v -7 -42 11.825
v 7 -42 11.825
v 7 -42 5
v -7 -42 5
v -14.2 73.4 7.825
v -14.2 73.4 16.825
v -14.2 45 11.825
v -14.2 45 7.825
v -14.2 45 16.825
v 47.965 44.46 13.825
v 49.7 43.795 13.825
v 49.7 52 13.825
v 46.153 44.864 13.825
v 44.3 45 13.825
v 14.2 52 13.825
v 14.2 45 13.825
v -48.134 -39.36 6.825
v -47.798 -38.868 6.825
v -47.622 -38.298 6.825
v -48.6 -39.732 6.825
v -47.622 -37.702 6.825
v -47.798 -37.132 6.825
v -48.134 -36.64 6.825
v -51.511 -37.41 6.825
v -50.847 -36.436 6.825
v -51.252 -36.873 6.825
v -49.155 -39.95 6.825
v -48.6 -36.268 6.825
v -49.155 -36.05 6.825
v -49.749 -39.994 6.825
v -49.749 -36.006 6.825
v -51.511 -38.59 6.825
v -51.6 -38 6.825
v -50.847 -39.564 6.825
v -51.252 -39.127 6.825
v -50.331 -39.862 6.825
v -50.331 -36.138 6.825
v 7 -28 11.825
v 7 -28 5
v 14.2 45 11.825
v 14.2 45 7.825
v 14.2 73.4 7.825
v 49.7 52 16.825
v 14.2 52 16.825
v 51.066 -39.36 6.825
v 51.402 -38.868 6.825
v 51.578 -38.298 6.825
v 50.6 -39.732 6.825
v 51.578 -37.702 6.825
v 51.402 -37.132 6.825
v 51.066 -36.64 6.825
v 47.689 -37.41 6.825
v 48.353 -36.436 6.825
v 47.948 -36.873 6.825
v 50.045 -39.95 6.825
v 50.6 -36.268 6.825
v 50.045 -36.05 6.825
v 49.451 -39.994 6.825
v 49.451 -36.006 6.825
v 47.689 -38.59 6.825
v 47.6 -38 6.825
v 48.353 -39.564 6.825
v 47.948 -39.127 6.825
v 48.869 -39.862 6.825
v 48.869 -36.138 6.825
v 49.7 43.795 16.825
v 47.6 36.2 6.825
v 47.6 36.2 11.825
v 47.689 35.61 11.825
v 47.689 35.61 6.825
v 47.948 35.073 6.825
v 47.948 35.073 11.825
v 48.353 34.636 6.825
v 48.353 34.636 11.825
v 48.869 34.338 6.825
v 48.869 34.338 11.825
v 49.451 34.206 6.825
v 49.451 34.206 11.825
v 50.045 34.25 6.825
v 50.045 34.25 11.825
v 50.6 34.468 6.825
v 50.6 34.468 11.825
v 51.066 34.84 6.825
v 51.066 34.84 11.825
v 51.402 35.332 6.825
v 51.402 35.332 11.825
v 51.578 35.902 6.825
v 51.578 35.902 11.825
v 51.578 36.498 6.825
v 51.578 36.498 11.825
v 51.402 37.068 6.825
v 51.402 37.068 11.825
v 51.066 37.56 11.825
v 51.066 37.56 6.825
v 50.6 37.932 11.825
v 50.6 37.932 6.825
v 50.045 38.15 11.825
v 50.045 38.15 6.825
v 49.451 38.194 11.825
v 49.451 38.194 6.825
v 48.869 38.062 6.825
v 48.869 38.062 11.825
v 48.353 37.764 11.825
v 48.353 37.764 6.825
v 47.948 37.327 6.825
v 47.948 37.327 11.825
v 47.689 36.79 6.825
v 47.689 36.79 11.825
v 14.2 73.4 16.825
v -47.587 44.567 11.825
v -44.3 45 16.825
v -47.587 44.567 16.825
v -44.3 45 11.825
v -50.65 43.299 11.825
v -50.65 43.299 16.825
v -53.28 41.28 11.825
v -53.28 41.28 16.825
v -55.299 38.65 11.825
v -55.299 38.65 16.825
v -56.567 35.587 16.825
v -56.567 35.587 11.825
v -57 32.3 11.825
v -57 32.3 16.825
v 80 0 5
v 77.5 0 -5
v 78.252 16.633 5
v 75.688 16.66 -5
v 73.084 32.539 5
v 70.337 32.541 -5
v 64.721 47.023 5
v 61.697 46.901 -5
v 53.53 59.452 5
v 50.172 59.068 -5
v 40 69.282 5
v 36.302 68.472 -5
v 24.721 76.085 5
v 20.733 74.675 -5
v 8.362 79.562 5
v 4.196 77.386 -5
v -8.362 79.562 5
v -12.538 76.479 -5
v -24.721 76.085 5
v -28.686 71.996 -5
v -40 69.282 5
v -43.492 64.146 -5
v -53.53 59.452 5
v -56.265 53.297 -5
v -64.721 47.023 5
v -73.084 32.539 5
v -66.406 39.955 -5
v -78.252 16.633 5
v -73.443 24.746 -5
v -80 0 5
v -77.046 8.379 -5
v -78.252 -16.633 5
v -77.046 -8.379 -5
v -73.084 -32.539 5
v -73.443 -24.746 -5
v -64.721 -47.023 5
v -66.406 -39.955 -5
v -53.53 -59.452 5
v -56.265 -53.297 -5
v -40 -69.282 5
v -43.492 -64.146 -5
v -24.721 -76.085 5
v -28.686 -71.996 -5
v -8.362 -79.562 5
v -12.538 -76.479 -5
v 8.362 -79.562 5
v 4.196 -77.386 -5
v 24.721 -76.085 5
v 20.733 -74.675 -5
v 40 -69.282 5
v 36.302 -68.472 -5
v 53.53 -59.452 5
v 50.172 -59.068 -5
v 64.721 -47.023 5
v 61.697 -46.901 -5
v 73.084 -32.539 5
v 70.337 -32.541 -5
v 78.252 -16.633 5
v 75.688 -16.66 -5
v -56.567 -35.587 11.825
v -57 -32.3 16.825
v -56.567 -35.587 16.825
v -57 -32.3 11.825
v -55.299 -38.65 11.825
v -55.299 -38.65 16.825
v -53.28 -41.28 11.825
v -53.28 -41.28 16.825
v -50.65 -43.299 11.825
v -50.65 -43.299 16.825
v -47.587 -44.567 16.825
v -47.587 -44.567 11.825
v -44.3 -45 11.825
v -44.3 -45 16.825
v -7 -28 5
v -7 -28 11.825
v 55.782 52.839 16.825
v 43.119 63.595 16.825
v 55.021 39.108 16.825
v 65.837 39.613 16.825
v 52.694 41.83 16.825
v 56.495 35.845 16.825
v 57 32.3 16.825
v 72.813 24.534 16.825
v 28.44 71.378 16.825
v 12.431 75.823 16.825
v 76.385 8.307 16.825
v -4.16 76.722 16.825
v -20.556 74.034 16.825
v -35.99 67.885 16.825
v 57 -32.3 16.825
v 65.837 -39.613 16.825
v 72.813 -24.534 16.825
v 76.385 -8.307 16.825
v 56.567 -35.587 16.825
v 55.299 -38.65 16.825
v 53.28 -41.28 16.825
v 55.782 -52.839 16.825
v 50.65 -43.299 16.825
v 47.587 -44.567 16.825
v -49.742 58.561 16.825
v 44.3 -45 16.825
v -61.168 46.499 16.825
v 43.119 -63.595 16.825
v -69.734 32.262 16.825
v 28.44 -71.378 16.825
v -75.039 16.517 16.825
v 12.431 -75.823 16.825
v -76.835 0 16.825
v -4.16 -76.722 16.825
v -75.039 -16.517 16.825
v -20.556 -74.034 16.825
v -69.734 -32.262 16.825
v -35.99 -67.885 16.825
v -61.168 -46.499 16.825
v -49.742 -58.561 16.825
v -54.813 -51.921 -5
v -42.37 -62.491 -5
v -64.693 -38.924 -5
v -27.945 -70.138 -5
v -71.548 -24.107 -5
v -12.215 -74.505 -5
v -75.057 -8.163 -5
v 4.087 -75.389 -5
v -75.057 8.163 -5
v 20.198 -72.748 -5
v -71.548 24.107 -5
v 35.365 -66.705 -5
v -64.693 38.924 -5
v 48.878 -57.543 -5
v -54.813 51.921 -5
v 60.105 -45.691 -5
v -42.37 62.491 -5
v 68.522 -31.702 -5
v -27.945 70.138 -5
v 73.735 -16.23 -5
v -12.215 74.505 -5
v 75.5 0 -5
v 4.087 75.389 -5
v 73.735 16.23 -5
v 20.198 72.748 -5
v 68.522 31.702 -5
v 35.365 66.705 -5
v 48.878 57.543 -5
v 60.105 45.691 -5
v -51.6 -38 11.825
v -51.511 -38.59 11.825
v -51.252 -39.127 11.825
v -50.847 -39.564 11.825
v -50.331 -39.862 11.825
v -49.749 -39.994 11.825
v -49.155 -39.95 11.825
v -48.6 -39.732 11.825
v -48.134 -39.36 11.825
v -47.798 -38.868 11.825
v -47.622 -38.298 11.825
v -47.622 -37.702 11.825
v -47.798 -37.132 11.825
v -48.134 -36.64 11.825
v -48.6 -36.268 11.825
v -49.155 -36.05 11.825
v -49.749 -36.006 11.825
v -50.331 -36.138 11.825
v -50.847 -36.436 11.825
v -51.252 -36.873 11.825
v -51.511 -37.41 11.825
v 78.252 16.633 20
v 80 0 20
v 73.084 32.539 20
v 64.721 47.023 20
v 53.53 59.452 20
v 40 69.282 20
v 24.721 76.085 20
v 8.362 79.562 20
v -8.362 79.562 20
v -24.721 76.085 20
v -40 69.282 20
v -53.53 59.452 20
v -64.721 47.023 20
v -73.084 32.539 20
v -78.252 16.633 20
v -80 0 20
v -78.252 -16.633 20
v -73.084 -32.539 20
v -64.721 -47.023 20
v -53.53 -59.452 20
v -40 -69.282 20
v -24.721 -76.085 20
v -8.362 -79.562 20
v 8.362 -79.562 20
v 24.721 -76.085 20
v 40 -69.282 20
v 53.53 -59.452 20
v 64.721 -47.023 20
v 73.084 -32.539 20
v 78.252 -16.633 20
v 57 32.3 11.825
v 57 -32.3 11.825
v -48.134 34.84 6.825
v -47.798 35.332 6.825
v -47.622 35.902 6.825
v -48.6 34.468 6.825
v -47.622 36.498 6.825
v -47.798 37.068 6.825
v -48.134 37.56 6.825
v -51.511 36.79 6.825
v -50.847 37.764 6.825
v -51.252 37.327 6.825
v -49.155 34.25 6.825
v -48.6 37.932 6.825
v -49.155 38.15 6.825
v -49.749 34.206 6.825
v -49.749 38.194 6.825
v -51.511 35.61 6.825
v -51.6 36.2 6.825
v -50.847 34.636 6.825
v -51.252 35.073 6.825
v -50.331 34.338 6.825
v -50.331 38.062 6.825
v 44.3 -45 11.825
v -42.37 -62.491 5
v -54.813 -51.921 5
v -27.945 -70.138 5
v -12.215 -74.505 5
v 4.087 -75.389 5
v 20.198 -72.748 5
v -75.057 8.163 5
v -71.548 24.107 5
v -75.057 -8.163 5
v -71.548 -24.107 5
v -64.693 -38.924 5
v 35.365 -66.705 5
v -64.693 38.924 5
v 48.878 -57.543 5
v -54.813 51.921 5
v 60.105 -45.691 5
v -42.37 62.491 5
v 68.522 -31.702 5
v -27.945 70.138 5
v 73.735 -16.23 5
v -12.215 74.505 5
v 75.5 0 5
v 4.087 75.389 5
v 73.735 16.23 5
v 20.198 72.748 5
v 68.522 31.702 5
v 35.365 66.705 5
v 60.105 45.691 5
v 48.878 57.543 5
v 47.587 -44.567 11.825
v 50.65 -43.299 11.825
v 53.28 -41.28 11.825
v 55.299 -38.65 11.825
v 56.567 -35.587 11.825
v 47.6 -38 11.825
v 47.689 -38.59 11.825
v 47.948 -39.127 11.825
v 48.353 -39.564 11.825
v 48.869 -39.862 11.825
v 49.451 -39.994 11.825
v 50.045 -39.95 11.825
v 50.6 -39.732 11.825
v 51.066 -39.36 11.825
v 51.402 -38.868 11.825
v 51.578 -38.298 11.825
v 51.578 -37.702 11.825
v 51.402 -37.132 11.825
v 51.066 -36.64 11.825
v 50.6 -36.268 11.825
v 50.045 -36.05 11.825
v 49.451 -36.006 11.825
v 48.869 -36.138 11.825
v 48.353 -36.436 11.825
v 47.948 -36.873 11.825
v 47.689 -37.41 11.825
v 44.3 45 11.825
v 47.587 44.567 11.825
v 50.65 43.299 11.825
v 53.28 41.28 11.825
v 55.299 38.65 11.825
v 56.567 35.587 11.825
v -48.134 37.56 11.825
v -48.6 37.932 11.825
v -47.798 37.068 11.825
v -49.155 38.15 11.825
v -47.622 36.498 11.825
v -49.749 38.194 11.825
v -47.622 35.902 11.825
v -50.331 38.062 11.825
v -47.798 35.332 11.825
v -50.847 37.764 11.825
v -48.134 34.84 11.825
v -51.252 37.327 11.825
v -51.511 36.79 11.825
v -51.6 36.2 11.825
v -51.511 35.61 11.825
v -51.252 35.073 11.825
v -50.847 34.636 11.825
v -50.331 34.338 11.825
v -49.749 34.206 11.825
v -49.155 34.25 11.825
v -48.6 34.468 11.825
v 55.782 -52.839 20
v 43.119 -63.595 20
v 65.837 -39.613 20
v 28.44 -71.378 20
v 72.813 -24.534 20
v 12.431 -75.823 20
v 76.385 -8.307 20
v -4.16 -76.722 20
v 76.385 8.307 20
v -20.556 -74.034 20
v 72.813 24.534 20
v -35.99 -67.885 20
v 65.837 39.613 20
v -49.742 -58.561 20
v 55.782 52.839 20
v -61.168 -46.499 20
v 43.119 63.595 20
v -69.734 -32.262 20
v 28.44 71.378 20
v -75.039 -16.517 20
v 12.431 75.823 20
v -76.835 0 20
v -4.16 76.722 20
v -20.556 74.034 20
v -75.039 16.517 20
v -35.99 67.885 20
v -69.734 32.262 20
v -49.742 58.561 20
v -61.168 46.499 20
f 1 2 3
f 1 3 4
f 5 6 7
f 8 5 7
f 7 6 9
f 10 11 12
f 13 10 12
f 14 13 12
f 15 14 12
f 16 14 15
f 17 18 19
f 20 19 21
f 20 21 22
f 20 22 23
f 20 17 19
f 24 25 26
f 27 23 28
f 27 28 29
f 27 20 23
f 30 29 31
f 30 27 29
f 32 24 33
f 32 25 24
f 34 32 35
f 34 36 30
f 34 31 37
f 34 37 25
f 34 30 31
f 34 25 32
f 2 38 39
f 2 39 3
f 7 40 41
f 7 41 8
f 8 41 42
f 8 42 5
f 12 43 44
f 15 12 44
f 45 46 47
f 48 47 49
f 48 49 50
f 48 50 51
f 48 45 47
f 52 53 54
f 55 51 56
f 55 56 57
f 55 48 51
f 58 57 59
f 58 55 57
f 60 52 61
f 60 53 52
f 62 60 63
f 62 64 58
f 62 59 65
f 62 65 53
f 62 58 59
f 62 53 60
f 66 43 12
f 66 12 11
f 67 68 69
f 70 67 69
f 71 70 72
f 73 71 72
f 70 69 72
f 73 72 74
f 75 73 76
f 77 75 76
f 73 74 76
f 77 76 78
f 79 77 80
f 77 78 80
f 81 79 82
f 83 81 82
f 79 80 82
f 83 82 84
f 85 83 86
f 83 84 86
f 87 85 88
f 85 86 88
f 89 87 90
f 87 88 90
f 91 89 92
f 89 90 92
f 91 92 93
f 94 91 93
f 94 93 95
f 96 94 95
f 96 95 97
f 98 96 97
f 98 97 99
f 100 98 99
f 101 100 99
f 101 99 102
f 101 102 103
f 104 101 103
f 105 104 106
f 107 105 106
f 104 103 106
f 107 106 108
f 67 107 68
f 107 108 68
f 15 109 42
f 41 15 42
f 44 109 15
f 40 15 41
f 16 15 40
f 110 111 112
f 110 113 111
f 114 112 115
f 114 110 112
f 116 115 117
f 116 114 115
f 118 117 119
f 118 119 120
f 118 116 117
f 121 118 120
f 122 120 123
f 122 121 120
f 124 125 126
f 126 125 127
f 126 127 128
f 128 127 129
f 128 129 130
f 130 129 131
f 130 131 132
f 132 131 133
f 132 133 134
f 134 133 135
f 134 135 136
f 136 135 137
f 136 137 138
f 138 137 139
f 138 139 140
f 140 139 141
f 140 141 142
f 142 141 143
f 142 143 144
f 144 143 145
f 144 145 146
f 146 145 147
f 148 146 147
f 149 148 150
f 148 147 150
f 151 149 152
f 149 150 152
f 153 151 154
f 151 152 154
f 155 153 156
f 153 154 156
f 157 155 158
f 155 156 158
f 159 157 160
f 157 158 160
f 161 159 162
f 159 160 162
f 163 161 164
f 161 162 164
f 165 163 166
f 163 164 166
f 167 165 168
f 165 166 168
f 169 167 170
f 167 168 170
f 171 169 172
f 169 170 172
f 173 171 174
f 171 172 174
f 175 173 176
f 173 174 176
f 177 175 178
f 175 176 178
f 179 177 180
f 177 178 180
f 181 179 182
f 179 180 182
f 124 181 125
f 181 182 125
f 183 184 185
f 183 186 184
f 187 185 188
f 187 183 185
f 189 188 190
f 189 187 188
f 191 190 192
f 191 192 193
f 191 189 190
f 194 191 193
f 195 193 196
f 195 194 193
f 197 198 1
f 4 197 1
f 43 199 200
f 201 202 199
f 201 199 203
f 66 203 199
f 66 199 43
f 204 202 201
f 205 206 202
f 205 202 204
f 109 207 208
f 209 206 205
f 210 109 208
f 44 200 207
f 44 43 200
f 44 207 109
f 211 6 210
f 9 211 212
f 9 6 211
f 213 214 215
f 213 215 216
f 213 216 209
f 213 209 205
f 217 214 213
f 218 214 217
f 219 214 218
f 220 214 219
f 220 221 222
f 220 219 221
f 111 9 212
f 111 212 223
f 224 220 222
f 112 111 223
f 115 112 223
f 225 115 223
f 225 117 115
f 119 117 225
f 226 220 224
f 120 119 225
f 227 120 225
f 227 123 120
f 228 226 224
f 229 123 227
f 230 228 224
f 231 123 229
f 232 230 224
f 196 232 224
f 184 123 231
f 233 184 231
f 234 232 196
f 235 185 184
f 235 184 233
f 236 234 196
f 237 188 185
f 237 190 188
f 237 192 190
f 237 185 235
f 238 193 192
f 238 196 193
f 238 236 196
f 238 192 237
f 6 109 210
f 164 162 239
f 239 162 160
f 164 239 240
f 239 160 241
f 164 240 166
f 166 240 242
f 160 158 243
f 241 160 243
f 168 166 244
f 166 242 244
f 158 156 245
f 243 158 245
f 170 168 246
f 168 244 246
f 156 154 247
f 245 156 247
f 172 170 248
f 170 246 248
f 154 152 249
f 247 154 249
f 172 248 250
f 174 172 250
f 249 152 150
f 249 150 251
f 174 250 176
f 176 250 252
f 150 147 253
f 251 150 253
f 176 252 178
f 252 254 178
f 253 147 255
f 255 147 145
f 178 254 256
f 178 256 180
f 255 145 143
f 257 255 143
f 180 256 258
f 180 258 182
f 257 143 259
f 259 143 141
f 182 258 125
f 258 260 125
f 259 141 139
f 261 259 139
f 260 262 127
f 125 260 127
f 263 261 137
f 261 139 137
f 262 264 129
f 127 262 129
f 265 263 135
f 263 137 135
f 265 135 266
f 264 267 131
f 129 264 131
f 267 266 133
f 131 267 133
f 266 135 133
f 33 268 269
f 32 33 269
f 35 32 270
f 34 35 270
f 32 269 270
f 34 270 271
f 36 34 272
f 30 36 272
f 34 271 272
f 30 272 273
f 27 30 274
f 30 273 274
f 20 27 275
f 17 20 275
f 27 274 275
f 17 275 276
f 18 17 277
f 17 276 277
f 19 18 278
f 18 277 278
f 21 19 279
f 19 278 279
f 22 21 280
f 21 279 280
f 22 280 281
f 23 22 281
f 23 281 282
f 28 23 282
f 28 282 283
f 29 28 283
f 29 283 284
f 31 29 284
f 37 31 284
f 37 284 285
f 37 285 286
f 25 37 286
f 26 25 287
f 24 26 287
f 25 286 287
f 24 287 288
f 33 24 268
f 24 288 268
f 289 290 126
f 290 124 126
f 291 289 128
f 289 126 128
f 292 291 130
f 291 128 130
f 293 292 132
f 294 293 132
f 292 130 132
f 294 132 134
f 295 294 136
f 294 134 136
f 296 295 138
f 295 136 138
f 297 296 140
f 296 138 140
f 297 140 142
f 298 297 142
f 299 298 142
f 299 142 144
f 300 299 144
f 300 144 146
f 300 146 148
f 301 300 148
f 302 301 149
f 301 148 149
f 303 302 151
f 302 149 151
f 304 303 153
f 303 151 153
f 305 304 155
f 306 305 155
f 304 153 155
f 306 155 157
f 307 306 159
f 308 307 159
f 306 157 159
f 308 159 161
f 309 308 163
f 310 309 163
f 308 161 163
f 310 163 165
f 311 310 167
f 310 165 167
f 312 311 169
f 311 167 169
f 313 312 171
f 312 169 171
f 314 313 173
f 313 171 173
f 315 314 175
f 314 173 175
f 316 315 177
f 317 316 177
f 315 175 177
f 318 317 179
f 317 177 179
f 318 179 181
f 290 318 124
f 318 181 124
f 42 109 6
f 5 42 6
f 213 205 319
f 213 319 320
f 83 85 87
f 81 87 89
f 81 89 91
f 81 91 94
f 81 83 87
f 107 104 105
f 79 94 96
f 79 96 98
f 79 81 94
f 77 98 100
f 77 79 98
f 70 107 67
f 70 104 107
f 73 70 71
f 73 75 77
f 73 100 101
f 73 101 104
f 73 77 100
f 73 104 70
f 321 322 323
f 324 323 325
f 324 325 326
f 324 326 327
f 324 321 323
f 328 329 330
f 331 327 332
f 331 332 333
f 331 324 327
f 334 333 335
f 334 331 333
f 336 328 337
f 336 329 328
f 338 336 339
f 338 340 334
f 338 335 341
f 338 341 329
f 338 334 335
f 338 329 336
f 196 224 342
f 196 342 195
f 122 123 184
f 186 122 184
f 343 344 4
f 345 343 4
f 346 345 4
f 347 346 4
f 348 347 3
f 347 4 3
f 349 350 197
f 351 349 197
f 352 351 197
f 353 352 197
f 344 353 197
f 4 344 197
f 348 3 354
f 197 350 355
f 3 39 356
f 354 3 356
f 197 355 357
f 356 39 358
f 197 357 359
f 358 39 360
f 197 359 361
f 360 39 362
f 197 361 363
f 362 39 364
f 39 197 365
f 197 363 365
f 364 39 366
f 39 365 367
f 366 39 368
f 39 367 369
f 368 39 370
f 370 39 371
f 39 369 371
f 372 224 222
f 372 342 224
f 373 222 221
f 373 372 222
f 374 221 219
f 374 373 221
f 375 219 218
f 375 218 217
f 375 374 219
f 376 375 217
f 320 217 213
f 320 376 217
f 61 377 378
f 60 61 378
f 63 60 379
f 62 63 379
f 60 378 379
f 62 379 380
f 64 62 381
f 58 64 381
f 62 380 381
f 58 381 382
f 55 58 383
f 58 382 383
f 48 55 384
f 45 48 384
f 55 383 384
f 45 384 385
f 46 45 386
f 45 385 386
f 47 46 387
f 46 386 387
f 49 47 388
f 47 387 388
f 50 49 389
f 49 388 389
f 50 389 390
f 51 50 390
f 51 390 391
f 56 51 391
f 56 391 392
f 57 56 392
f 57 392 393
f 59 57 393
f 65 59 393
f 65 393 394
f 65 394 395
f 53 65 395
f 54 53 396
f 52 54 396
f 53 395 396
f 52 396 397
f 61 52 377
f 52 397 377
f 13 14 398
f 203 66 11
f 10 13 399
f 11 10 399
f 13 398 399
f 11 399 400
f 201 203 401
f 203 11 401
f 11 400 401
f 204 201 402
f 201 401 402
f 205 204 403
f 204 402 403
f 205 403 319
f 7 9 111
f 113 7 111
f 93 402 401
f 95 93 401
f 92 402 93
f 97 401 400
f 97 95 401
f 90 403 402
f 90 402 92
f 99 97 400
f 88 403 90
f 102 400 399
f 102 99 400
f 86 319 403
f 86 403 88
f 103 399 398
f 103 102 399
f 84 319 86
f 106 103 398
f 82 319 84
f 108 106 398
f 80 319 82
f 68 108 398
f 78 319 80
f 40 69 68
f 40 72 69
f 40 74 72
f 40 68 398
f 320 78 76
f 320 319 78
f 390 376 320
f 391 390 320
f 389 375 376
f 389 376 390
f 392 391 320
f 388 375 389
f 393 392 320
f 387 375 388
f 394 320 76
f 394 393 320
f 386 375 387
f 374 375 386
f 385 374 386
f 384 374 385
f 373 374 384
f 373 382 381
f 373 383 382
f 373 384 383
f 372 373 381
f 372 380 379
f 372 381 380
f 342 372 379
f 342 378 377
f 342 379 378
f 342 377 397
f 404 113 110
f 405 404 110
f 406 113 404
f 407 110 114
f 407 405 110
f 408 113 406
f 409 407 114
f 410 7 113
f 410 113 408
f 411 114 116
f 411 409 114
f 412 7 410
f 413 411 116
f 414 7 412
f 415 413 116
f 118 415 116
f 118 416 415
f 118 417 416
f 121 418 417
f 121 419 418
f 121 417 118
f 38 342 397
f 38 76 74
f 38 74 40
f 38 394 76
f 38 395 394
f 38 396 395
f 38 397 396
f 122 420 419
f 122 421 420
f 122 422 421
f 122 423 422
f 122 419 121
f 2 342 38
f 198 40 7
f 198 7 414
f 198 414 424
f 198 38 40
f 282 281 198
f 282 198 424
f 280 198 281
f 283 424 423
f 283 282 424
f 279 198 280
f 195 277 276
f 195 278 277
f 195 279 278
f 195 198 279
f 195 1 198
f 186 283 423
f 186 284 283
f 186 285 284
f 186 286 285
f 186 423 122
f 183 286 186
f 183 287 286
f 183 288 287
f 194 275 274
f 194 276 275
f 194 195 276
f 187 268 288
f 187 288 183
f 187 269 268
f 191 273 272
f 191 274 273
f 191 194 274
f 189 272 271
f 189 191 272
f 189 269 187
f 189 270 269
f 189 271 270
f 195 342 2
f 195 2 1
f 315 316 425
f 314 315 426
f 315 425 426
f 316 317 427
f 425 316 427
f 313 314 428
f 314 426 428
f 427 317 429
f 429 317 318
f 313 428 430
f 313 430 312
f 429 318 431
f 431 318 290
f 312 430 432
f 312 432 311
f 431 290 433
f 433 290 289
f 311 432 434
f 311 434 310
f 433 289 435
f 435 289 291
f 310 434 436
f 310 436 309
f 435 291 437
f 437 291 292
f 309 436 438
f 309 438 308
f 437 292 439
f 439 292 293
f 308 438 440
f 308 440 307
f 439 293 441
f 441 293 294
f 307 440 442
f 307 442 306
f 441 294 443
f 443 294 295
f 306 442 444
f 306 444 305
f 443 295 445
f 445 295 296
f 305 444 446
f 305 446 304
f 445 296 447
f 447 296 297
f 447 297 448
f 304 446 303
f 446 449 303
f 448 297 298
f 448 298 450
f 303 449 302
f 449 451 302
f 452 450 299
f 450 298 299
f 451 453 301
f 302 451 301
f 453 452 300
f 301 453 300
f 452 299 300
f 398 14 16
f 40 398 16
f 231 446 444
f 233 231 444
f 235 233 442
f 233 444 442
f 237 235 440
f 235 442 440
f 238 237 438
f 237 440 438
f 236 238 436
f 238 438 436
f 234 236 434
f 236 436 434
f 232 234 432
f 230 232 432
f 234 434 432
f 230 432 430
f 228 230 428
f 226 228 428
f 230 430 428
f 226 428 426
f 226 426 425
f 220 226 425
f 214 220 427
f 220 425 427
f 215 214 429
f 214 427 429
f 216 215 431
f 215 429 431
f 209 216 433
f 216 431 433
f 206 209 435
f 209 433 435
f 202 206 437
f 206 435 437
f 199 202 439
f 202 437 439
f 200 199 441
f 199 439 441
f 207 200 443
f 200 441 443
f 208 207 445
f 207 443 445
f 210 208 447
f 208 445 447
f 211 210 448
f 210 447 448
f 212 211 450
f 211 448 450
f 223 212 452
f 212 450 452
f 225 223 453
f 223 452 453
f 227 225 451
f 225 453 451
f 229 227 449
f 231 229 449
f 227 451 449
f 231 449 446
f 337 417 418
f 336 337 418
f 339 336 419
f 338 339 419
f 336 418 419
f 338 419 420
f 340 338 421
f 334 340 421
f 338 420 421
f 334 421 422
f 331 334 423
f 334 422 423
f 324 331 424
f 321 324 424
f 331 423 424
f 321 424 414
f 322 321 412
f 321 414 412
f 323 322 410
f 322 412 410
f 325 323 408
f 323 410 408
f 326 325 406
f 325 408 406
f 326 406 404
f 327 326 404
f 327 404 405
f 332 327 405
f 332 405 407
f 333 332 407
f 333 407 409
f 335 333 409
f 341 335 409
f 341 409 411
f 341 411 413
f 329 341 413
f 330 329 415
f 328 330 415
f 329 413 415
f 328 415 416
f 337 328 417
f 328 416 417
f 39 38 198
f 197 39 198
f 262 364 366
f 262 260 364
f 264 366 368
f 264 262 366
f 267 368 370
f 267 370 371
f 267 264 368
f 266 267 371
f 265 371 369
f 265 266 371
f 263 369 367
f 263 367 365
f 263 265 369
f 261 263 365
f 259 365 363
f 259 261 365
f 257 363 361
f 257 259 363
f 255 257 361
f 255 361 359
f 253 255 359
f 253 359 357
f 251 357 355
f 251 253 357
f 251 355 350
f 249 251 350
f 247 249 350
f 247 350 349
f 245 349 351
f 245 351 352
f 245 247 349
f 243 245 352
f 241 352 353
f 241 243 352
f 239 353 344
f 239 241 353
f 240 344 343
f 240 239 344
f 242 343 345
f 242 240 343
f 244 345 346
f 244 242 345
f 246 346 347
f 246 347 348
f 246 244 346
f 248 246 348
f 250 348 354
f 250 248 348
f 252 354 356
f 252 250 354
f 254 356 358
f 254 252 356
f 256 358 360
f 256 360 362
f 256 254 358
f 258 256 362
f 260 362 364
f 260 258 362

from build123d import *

# Parameters (mm, degrees)
SKETCH001_R     = 76.835
POCKET_DEPTH    = 3.175
SKETCH002_W     = 114
SKETCH002_H     = 90
POCKET001_DEPTH = 5
SKETCH003_W     = 14
SKETCH003_H     = 14
POCKET002_DEPTH = 16.826
SKETCH004_W     = 28.4
SKETCH004_H     = 28.4
POCKET003_DEPTH = 9
SKETCH005_W     = 35.5
SKETCH005_H     = 7
POCKET004_DEPTH = 3
FILLET_R        = 12.7
SKETCH006_R     = 2
POCKET005_DEPTH = 5


with BuildPart() as part:
    # Sketch → Revolution (revolve)
    with BuildSketch(Plane.XZ):
        Polygon((0, 5), (0, 20), (80, 20), (80, 5), (77.5, -5), (75.5, -5), (75.5, 0), (75.5, 5), align=None)
    revolve(axis=Axis((0, 0, 0), (0, 0, 1)))

    # Sketch001 (on Face1 of Revolution) → Pocket (cut)
    with BuildSketch(Plane(origin=(0, 0, 20), x_dir=(-1, 0, 0), z_dir=(0, 0, 1))):
        Circle(SKETCH001_R)
    extrude(amount=-POCKET_DEPTH, mode=Mode.SUBTRACT)

    # Sketch002 (on Face5 of Pocket) → Pocket001 (cut)
    with BuildSketch(Plane(origin=(0, 0, 16.825), x_dir=(-1, 0, 0), z_dir=(0, 0, 1))):
        Rectangle(SKETCH002_W, SKETCH002_H)
    extrude(amount=-POCKET001_DEPTH, mode=Mode.SUBTRACT)

    # Sketch003 (on Face12 of Pocket001) → Pocket002 (cut, through all)
    with BuildSketch(Plane(origin=(0, 0, 11.825), x_dir=(-1, 0, 0), z_dir=(0, 0, 1))):
        with Locations((0, 35)):
            Rectangle(SKETCH003_W, SKETCH003_H)
    extrude(amount=-POCKET002_DEPTH, mode=Mode.SUBTRACT)

    # Sketch004 (on Face5 of Pocket002) → Pocket003 (cut)
    with BuildSketch(Plane(origin=(0, 0, 16.825), x_dir=(-1, 0, 0), z_dir=(0, 0, 1))):
        with Locations((0, -59.2)):
            Rectangle(SKETCH004_W, SKETCH004_H)
    extrude(amount=-POCKET003_DEPTH, mode=Mode.SUBTRACT)

    # Sketch005 (on Face5 of Pocket003) → Pocket004 (cut)
    with BuildSketch(Plane(origin=(0, 0, 16.825), x_dir=(-1, 0, 0), z_dir=(0, 0, 1))):
        with Locations((-31.95, -48.5)):
            Rectangle(SKETCH005_W, SKETCH005_H)
    extrude(amount=-POCKET004_DEPTH, mode=Mode.SUBTRACT)

    # Fillet
    fillet_edges = [part.edges().sort_by_distance(p)[0] for p in [
        (57, -45, 14.325),
        (57, 45, 14.325),
        (-57, -45, 14.325),
        (-57, 45, 14.325),
    ]]
    fillet(fillet_edges, radius=FILLET_R)

    # Sketch006 (on Face17 of Fillet) → Pocket005 (cut)
    with BuildSketch(Plane(origin=(0, 0, 11.825), x_dir=(-1, 0, 0), z_dir=(0, 0, 1))):
        with Locations((-49.6, 38)):
            Circle(SKETCH006_R)
        with Locations((49.6, 38)):
            Circle(SKETCH006_R)
        with Locations((-49.6, -36.2)):
            Circle(SKETCH006_R)
        with Locations((49.6, -36.2)):
            Circle(SKETCH006_R)
    extrude(amount=-POCKET005_DEPTH, mode=Mode.SUBTRACT)


solid = part.part
